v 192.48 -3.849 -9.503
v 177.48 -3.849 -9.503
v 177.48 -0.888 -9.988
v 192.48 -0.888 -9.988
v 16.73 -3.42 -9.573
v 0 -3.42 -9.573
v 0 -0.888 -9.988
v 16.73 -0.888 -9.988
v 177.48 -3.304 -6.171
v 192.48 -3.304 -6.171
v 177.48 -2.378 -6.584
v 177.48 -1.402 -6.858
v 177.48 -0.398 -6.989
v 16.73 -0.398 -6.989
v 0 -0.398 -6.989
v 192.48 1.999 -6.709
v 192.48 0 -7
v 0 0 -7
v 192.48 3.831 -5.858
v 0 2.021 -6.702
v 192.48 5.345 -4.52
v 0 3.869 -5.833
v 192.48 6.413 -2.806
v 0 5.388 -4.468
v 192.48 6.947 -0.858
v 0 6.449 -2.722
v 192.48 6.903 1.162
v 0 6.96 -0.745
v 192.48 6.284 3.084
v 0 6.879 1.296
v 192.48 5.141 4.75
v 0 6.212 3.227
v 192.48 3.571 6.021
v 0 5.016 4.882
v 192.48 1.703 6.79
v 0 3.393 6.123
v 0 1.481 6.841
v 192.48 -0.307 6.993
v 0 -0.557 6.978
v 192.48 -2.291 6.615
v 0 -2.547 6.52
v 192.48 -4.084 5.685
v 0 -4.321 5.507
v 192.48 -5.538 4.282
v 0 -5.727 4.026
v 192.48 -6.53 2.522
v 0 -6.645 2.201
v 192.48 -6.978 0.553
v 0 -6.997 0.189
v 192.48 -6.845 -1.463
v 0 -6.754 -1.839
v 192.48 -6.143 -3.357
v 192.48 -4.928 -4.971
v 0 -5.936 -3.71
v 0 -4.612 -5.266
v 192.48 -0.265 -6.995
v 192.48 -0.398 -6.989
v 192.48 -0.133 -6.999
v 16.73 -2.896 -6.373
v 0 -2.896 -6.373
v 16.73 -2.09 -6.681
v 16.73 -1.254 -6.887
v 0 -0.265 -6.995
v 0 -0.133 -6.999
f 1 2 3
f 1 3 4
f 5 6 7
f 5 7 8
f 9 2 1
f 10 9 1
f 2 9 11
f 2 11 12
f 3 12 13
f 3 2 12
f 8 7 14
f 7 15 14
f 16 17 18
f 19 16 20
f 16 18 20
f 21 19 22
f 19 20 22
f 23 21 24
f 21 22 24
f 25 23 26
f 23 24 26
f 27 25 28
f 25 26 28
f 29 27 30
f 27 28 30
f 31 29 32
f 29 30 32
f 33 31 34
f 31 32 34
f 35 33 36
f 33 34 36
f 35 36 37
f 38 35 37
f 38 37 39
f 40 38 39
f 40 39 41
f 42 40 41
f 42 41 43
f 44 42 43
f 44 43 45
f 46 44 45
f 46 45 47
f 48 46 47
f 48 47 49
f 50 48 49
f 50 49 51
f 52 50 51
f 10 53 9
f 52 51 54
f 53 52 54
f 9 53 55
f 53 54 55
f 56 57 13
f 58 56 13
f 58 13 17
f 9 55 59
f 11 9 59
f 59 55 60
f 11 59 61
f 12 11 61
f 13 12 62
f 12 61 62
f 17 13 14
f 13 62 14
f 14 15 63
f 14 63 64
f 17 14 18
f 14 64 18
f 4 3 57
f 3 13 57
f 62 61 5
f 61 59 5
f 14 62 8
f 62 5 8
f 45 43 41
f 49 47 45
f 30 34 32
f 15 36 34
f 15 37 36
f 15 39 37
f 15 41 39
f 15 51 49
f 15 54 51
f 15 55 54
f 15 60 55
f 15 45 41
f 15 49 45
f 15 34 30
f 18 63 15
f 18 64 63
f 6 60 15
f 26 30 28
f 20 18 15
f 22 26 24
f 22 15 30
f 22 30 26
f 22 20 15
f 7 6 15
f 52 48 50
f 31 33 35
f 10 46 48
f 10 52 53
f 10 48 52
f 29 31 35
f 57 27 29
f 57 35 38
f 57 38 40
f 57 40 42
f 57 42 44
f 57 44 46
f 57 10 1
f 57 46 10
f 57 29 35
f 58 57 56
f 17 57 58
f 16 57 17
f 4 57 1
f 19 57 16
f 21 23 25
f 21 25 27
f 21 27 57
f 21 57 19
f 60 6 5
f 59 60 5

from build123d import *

# Parameters (mm, degrees)
SKETCH1_R             = 7
BOSS_EXTRUDE1_DEPTH   = 192.48
SKETCH2_W             = 15
SKETCH2_H             = 3
BOSS_EXTRUDE2_DEPTH   = 3
SKETCH2_W_2           = 16.730233444
SKETCH2_H_2           = 2.564845708
BOSS_EXTRUDE2_2_DEPTH = 3
SKETCH3_W             = 16.730233444
SKETCH3_H             = 2.564845708
BOSS_EXTRUDE3_DEPTH   = 10
SKETCH4_W             = 15
SKETCH4_H             = 3
BOSS_EXTRUDE4_DEPTH   = 10


with BuildPart() as part:
    # Sketch1 → Boss-Extrude1 (new body)
    with BuildSketch(Plane(origin=(0, 0, 0), x_dir=(0, 0, -1), z_dir=(1, 0, 0))):
        Circle(SKETCH1_R)
    extrude(amount=BOSS_EXTRUDE1_DEPTH)



with BuildPart() as body_2:
    # Sketch2 → Boss-Extrude2 (new body)
    with BuildSketch(Plane(origin=(0, -1.130854734, -6.908050924), x_dir=(1, 0, 0), z_dir=(0, -0.161550676, -0.986864418))):
        with Locations((184.98, 0.763298878)):
            Rectangle(SKETCH2_W, SKETCH2_H)
    extrude(amount=BOSS_EXTRUDE2_DEPTH)


with BuildPart() as body_3:
    # Sketch2 → Boss-Extrude2 2 (new body)
    with BuildSketch(Plane(origin=(0, -1.130854734, -6.908050924), x_dir=(1, 0, 0), z_dir=(0, -0.161550676, -0.986864418))):
        with Locations((8.365116722, 0.545721732)):
            Rectangle(SKETCH2_W_2, SKETCH2_H_2)
    extrude(amount=BOSS_EXTRUDE2_2_DEPTH)


with BuildPart() as part_1:
    add(part.part)

    add(body_3.part)  # Boss-Extrude3 merges body 3
    # Sketch3 → Boss-Extrude3 (add)
    with BuildSketch(Plane(origin=(0, -1.130854734, -6.908050924), x_dir=(1, 0, 0), z_dir=(0, 0.161550676, 0.986864418))):
        with Locations((8.365116722, -0.545721732)):
            Rectangle(SKETCH3_W, SKETCH3_H)
    extrude(amount=BOSS_EXTRUDE3_DEPTH)


    add(body_2.part)  # Boss-Extrude4 merges body 2
    # Sketch4 → Boss-Extrude4 (add)
    with BuildSketch(Plane(origin=(0, -1.130854734, -6.908050924), x_dir=(1, 0, 0), z_dir=(0, 0.161550676, 0.986864418))):
        with Locations((184.98, -0.763298878)):
            Rectangle(SKETCH4_W, SKETCH4_H)
    extrude(amount=BOSS_EXTRUDE4_DEPTH)


solid = part_1.part
